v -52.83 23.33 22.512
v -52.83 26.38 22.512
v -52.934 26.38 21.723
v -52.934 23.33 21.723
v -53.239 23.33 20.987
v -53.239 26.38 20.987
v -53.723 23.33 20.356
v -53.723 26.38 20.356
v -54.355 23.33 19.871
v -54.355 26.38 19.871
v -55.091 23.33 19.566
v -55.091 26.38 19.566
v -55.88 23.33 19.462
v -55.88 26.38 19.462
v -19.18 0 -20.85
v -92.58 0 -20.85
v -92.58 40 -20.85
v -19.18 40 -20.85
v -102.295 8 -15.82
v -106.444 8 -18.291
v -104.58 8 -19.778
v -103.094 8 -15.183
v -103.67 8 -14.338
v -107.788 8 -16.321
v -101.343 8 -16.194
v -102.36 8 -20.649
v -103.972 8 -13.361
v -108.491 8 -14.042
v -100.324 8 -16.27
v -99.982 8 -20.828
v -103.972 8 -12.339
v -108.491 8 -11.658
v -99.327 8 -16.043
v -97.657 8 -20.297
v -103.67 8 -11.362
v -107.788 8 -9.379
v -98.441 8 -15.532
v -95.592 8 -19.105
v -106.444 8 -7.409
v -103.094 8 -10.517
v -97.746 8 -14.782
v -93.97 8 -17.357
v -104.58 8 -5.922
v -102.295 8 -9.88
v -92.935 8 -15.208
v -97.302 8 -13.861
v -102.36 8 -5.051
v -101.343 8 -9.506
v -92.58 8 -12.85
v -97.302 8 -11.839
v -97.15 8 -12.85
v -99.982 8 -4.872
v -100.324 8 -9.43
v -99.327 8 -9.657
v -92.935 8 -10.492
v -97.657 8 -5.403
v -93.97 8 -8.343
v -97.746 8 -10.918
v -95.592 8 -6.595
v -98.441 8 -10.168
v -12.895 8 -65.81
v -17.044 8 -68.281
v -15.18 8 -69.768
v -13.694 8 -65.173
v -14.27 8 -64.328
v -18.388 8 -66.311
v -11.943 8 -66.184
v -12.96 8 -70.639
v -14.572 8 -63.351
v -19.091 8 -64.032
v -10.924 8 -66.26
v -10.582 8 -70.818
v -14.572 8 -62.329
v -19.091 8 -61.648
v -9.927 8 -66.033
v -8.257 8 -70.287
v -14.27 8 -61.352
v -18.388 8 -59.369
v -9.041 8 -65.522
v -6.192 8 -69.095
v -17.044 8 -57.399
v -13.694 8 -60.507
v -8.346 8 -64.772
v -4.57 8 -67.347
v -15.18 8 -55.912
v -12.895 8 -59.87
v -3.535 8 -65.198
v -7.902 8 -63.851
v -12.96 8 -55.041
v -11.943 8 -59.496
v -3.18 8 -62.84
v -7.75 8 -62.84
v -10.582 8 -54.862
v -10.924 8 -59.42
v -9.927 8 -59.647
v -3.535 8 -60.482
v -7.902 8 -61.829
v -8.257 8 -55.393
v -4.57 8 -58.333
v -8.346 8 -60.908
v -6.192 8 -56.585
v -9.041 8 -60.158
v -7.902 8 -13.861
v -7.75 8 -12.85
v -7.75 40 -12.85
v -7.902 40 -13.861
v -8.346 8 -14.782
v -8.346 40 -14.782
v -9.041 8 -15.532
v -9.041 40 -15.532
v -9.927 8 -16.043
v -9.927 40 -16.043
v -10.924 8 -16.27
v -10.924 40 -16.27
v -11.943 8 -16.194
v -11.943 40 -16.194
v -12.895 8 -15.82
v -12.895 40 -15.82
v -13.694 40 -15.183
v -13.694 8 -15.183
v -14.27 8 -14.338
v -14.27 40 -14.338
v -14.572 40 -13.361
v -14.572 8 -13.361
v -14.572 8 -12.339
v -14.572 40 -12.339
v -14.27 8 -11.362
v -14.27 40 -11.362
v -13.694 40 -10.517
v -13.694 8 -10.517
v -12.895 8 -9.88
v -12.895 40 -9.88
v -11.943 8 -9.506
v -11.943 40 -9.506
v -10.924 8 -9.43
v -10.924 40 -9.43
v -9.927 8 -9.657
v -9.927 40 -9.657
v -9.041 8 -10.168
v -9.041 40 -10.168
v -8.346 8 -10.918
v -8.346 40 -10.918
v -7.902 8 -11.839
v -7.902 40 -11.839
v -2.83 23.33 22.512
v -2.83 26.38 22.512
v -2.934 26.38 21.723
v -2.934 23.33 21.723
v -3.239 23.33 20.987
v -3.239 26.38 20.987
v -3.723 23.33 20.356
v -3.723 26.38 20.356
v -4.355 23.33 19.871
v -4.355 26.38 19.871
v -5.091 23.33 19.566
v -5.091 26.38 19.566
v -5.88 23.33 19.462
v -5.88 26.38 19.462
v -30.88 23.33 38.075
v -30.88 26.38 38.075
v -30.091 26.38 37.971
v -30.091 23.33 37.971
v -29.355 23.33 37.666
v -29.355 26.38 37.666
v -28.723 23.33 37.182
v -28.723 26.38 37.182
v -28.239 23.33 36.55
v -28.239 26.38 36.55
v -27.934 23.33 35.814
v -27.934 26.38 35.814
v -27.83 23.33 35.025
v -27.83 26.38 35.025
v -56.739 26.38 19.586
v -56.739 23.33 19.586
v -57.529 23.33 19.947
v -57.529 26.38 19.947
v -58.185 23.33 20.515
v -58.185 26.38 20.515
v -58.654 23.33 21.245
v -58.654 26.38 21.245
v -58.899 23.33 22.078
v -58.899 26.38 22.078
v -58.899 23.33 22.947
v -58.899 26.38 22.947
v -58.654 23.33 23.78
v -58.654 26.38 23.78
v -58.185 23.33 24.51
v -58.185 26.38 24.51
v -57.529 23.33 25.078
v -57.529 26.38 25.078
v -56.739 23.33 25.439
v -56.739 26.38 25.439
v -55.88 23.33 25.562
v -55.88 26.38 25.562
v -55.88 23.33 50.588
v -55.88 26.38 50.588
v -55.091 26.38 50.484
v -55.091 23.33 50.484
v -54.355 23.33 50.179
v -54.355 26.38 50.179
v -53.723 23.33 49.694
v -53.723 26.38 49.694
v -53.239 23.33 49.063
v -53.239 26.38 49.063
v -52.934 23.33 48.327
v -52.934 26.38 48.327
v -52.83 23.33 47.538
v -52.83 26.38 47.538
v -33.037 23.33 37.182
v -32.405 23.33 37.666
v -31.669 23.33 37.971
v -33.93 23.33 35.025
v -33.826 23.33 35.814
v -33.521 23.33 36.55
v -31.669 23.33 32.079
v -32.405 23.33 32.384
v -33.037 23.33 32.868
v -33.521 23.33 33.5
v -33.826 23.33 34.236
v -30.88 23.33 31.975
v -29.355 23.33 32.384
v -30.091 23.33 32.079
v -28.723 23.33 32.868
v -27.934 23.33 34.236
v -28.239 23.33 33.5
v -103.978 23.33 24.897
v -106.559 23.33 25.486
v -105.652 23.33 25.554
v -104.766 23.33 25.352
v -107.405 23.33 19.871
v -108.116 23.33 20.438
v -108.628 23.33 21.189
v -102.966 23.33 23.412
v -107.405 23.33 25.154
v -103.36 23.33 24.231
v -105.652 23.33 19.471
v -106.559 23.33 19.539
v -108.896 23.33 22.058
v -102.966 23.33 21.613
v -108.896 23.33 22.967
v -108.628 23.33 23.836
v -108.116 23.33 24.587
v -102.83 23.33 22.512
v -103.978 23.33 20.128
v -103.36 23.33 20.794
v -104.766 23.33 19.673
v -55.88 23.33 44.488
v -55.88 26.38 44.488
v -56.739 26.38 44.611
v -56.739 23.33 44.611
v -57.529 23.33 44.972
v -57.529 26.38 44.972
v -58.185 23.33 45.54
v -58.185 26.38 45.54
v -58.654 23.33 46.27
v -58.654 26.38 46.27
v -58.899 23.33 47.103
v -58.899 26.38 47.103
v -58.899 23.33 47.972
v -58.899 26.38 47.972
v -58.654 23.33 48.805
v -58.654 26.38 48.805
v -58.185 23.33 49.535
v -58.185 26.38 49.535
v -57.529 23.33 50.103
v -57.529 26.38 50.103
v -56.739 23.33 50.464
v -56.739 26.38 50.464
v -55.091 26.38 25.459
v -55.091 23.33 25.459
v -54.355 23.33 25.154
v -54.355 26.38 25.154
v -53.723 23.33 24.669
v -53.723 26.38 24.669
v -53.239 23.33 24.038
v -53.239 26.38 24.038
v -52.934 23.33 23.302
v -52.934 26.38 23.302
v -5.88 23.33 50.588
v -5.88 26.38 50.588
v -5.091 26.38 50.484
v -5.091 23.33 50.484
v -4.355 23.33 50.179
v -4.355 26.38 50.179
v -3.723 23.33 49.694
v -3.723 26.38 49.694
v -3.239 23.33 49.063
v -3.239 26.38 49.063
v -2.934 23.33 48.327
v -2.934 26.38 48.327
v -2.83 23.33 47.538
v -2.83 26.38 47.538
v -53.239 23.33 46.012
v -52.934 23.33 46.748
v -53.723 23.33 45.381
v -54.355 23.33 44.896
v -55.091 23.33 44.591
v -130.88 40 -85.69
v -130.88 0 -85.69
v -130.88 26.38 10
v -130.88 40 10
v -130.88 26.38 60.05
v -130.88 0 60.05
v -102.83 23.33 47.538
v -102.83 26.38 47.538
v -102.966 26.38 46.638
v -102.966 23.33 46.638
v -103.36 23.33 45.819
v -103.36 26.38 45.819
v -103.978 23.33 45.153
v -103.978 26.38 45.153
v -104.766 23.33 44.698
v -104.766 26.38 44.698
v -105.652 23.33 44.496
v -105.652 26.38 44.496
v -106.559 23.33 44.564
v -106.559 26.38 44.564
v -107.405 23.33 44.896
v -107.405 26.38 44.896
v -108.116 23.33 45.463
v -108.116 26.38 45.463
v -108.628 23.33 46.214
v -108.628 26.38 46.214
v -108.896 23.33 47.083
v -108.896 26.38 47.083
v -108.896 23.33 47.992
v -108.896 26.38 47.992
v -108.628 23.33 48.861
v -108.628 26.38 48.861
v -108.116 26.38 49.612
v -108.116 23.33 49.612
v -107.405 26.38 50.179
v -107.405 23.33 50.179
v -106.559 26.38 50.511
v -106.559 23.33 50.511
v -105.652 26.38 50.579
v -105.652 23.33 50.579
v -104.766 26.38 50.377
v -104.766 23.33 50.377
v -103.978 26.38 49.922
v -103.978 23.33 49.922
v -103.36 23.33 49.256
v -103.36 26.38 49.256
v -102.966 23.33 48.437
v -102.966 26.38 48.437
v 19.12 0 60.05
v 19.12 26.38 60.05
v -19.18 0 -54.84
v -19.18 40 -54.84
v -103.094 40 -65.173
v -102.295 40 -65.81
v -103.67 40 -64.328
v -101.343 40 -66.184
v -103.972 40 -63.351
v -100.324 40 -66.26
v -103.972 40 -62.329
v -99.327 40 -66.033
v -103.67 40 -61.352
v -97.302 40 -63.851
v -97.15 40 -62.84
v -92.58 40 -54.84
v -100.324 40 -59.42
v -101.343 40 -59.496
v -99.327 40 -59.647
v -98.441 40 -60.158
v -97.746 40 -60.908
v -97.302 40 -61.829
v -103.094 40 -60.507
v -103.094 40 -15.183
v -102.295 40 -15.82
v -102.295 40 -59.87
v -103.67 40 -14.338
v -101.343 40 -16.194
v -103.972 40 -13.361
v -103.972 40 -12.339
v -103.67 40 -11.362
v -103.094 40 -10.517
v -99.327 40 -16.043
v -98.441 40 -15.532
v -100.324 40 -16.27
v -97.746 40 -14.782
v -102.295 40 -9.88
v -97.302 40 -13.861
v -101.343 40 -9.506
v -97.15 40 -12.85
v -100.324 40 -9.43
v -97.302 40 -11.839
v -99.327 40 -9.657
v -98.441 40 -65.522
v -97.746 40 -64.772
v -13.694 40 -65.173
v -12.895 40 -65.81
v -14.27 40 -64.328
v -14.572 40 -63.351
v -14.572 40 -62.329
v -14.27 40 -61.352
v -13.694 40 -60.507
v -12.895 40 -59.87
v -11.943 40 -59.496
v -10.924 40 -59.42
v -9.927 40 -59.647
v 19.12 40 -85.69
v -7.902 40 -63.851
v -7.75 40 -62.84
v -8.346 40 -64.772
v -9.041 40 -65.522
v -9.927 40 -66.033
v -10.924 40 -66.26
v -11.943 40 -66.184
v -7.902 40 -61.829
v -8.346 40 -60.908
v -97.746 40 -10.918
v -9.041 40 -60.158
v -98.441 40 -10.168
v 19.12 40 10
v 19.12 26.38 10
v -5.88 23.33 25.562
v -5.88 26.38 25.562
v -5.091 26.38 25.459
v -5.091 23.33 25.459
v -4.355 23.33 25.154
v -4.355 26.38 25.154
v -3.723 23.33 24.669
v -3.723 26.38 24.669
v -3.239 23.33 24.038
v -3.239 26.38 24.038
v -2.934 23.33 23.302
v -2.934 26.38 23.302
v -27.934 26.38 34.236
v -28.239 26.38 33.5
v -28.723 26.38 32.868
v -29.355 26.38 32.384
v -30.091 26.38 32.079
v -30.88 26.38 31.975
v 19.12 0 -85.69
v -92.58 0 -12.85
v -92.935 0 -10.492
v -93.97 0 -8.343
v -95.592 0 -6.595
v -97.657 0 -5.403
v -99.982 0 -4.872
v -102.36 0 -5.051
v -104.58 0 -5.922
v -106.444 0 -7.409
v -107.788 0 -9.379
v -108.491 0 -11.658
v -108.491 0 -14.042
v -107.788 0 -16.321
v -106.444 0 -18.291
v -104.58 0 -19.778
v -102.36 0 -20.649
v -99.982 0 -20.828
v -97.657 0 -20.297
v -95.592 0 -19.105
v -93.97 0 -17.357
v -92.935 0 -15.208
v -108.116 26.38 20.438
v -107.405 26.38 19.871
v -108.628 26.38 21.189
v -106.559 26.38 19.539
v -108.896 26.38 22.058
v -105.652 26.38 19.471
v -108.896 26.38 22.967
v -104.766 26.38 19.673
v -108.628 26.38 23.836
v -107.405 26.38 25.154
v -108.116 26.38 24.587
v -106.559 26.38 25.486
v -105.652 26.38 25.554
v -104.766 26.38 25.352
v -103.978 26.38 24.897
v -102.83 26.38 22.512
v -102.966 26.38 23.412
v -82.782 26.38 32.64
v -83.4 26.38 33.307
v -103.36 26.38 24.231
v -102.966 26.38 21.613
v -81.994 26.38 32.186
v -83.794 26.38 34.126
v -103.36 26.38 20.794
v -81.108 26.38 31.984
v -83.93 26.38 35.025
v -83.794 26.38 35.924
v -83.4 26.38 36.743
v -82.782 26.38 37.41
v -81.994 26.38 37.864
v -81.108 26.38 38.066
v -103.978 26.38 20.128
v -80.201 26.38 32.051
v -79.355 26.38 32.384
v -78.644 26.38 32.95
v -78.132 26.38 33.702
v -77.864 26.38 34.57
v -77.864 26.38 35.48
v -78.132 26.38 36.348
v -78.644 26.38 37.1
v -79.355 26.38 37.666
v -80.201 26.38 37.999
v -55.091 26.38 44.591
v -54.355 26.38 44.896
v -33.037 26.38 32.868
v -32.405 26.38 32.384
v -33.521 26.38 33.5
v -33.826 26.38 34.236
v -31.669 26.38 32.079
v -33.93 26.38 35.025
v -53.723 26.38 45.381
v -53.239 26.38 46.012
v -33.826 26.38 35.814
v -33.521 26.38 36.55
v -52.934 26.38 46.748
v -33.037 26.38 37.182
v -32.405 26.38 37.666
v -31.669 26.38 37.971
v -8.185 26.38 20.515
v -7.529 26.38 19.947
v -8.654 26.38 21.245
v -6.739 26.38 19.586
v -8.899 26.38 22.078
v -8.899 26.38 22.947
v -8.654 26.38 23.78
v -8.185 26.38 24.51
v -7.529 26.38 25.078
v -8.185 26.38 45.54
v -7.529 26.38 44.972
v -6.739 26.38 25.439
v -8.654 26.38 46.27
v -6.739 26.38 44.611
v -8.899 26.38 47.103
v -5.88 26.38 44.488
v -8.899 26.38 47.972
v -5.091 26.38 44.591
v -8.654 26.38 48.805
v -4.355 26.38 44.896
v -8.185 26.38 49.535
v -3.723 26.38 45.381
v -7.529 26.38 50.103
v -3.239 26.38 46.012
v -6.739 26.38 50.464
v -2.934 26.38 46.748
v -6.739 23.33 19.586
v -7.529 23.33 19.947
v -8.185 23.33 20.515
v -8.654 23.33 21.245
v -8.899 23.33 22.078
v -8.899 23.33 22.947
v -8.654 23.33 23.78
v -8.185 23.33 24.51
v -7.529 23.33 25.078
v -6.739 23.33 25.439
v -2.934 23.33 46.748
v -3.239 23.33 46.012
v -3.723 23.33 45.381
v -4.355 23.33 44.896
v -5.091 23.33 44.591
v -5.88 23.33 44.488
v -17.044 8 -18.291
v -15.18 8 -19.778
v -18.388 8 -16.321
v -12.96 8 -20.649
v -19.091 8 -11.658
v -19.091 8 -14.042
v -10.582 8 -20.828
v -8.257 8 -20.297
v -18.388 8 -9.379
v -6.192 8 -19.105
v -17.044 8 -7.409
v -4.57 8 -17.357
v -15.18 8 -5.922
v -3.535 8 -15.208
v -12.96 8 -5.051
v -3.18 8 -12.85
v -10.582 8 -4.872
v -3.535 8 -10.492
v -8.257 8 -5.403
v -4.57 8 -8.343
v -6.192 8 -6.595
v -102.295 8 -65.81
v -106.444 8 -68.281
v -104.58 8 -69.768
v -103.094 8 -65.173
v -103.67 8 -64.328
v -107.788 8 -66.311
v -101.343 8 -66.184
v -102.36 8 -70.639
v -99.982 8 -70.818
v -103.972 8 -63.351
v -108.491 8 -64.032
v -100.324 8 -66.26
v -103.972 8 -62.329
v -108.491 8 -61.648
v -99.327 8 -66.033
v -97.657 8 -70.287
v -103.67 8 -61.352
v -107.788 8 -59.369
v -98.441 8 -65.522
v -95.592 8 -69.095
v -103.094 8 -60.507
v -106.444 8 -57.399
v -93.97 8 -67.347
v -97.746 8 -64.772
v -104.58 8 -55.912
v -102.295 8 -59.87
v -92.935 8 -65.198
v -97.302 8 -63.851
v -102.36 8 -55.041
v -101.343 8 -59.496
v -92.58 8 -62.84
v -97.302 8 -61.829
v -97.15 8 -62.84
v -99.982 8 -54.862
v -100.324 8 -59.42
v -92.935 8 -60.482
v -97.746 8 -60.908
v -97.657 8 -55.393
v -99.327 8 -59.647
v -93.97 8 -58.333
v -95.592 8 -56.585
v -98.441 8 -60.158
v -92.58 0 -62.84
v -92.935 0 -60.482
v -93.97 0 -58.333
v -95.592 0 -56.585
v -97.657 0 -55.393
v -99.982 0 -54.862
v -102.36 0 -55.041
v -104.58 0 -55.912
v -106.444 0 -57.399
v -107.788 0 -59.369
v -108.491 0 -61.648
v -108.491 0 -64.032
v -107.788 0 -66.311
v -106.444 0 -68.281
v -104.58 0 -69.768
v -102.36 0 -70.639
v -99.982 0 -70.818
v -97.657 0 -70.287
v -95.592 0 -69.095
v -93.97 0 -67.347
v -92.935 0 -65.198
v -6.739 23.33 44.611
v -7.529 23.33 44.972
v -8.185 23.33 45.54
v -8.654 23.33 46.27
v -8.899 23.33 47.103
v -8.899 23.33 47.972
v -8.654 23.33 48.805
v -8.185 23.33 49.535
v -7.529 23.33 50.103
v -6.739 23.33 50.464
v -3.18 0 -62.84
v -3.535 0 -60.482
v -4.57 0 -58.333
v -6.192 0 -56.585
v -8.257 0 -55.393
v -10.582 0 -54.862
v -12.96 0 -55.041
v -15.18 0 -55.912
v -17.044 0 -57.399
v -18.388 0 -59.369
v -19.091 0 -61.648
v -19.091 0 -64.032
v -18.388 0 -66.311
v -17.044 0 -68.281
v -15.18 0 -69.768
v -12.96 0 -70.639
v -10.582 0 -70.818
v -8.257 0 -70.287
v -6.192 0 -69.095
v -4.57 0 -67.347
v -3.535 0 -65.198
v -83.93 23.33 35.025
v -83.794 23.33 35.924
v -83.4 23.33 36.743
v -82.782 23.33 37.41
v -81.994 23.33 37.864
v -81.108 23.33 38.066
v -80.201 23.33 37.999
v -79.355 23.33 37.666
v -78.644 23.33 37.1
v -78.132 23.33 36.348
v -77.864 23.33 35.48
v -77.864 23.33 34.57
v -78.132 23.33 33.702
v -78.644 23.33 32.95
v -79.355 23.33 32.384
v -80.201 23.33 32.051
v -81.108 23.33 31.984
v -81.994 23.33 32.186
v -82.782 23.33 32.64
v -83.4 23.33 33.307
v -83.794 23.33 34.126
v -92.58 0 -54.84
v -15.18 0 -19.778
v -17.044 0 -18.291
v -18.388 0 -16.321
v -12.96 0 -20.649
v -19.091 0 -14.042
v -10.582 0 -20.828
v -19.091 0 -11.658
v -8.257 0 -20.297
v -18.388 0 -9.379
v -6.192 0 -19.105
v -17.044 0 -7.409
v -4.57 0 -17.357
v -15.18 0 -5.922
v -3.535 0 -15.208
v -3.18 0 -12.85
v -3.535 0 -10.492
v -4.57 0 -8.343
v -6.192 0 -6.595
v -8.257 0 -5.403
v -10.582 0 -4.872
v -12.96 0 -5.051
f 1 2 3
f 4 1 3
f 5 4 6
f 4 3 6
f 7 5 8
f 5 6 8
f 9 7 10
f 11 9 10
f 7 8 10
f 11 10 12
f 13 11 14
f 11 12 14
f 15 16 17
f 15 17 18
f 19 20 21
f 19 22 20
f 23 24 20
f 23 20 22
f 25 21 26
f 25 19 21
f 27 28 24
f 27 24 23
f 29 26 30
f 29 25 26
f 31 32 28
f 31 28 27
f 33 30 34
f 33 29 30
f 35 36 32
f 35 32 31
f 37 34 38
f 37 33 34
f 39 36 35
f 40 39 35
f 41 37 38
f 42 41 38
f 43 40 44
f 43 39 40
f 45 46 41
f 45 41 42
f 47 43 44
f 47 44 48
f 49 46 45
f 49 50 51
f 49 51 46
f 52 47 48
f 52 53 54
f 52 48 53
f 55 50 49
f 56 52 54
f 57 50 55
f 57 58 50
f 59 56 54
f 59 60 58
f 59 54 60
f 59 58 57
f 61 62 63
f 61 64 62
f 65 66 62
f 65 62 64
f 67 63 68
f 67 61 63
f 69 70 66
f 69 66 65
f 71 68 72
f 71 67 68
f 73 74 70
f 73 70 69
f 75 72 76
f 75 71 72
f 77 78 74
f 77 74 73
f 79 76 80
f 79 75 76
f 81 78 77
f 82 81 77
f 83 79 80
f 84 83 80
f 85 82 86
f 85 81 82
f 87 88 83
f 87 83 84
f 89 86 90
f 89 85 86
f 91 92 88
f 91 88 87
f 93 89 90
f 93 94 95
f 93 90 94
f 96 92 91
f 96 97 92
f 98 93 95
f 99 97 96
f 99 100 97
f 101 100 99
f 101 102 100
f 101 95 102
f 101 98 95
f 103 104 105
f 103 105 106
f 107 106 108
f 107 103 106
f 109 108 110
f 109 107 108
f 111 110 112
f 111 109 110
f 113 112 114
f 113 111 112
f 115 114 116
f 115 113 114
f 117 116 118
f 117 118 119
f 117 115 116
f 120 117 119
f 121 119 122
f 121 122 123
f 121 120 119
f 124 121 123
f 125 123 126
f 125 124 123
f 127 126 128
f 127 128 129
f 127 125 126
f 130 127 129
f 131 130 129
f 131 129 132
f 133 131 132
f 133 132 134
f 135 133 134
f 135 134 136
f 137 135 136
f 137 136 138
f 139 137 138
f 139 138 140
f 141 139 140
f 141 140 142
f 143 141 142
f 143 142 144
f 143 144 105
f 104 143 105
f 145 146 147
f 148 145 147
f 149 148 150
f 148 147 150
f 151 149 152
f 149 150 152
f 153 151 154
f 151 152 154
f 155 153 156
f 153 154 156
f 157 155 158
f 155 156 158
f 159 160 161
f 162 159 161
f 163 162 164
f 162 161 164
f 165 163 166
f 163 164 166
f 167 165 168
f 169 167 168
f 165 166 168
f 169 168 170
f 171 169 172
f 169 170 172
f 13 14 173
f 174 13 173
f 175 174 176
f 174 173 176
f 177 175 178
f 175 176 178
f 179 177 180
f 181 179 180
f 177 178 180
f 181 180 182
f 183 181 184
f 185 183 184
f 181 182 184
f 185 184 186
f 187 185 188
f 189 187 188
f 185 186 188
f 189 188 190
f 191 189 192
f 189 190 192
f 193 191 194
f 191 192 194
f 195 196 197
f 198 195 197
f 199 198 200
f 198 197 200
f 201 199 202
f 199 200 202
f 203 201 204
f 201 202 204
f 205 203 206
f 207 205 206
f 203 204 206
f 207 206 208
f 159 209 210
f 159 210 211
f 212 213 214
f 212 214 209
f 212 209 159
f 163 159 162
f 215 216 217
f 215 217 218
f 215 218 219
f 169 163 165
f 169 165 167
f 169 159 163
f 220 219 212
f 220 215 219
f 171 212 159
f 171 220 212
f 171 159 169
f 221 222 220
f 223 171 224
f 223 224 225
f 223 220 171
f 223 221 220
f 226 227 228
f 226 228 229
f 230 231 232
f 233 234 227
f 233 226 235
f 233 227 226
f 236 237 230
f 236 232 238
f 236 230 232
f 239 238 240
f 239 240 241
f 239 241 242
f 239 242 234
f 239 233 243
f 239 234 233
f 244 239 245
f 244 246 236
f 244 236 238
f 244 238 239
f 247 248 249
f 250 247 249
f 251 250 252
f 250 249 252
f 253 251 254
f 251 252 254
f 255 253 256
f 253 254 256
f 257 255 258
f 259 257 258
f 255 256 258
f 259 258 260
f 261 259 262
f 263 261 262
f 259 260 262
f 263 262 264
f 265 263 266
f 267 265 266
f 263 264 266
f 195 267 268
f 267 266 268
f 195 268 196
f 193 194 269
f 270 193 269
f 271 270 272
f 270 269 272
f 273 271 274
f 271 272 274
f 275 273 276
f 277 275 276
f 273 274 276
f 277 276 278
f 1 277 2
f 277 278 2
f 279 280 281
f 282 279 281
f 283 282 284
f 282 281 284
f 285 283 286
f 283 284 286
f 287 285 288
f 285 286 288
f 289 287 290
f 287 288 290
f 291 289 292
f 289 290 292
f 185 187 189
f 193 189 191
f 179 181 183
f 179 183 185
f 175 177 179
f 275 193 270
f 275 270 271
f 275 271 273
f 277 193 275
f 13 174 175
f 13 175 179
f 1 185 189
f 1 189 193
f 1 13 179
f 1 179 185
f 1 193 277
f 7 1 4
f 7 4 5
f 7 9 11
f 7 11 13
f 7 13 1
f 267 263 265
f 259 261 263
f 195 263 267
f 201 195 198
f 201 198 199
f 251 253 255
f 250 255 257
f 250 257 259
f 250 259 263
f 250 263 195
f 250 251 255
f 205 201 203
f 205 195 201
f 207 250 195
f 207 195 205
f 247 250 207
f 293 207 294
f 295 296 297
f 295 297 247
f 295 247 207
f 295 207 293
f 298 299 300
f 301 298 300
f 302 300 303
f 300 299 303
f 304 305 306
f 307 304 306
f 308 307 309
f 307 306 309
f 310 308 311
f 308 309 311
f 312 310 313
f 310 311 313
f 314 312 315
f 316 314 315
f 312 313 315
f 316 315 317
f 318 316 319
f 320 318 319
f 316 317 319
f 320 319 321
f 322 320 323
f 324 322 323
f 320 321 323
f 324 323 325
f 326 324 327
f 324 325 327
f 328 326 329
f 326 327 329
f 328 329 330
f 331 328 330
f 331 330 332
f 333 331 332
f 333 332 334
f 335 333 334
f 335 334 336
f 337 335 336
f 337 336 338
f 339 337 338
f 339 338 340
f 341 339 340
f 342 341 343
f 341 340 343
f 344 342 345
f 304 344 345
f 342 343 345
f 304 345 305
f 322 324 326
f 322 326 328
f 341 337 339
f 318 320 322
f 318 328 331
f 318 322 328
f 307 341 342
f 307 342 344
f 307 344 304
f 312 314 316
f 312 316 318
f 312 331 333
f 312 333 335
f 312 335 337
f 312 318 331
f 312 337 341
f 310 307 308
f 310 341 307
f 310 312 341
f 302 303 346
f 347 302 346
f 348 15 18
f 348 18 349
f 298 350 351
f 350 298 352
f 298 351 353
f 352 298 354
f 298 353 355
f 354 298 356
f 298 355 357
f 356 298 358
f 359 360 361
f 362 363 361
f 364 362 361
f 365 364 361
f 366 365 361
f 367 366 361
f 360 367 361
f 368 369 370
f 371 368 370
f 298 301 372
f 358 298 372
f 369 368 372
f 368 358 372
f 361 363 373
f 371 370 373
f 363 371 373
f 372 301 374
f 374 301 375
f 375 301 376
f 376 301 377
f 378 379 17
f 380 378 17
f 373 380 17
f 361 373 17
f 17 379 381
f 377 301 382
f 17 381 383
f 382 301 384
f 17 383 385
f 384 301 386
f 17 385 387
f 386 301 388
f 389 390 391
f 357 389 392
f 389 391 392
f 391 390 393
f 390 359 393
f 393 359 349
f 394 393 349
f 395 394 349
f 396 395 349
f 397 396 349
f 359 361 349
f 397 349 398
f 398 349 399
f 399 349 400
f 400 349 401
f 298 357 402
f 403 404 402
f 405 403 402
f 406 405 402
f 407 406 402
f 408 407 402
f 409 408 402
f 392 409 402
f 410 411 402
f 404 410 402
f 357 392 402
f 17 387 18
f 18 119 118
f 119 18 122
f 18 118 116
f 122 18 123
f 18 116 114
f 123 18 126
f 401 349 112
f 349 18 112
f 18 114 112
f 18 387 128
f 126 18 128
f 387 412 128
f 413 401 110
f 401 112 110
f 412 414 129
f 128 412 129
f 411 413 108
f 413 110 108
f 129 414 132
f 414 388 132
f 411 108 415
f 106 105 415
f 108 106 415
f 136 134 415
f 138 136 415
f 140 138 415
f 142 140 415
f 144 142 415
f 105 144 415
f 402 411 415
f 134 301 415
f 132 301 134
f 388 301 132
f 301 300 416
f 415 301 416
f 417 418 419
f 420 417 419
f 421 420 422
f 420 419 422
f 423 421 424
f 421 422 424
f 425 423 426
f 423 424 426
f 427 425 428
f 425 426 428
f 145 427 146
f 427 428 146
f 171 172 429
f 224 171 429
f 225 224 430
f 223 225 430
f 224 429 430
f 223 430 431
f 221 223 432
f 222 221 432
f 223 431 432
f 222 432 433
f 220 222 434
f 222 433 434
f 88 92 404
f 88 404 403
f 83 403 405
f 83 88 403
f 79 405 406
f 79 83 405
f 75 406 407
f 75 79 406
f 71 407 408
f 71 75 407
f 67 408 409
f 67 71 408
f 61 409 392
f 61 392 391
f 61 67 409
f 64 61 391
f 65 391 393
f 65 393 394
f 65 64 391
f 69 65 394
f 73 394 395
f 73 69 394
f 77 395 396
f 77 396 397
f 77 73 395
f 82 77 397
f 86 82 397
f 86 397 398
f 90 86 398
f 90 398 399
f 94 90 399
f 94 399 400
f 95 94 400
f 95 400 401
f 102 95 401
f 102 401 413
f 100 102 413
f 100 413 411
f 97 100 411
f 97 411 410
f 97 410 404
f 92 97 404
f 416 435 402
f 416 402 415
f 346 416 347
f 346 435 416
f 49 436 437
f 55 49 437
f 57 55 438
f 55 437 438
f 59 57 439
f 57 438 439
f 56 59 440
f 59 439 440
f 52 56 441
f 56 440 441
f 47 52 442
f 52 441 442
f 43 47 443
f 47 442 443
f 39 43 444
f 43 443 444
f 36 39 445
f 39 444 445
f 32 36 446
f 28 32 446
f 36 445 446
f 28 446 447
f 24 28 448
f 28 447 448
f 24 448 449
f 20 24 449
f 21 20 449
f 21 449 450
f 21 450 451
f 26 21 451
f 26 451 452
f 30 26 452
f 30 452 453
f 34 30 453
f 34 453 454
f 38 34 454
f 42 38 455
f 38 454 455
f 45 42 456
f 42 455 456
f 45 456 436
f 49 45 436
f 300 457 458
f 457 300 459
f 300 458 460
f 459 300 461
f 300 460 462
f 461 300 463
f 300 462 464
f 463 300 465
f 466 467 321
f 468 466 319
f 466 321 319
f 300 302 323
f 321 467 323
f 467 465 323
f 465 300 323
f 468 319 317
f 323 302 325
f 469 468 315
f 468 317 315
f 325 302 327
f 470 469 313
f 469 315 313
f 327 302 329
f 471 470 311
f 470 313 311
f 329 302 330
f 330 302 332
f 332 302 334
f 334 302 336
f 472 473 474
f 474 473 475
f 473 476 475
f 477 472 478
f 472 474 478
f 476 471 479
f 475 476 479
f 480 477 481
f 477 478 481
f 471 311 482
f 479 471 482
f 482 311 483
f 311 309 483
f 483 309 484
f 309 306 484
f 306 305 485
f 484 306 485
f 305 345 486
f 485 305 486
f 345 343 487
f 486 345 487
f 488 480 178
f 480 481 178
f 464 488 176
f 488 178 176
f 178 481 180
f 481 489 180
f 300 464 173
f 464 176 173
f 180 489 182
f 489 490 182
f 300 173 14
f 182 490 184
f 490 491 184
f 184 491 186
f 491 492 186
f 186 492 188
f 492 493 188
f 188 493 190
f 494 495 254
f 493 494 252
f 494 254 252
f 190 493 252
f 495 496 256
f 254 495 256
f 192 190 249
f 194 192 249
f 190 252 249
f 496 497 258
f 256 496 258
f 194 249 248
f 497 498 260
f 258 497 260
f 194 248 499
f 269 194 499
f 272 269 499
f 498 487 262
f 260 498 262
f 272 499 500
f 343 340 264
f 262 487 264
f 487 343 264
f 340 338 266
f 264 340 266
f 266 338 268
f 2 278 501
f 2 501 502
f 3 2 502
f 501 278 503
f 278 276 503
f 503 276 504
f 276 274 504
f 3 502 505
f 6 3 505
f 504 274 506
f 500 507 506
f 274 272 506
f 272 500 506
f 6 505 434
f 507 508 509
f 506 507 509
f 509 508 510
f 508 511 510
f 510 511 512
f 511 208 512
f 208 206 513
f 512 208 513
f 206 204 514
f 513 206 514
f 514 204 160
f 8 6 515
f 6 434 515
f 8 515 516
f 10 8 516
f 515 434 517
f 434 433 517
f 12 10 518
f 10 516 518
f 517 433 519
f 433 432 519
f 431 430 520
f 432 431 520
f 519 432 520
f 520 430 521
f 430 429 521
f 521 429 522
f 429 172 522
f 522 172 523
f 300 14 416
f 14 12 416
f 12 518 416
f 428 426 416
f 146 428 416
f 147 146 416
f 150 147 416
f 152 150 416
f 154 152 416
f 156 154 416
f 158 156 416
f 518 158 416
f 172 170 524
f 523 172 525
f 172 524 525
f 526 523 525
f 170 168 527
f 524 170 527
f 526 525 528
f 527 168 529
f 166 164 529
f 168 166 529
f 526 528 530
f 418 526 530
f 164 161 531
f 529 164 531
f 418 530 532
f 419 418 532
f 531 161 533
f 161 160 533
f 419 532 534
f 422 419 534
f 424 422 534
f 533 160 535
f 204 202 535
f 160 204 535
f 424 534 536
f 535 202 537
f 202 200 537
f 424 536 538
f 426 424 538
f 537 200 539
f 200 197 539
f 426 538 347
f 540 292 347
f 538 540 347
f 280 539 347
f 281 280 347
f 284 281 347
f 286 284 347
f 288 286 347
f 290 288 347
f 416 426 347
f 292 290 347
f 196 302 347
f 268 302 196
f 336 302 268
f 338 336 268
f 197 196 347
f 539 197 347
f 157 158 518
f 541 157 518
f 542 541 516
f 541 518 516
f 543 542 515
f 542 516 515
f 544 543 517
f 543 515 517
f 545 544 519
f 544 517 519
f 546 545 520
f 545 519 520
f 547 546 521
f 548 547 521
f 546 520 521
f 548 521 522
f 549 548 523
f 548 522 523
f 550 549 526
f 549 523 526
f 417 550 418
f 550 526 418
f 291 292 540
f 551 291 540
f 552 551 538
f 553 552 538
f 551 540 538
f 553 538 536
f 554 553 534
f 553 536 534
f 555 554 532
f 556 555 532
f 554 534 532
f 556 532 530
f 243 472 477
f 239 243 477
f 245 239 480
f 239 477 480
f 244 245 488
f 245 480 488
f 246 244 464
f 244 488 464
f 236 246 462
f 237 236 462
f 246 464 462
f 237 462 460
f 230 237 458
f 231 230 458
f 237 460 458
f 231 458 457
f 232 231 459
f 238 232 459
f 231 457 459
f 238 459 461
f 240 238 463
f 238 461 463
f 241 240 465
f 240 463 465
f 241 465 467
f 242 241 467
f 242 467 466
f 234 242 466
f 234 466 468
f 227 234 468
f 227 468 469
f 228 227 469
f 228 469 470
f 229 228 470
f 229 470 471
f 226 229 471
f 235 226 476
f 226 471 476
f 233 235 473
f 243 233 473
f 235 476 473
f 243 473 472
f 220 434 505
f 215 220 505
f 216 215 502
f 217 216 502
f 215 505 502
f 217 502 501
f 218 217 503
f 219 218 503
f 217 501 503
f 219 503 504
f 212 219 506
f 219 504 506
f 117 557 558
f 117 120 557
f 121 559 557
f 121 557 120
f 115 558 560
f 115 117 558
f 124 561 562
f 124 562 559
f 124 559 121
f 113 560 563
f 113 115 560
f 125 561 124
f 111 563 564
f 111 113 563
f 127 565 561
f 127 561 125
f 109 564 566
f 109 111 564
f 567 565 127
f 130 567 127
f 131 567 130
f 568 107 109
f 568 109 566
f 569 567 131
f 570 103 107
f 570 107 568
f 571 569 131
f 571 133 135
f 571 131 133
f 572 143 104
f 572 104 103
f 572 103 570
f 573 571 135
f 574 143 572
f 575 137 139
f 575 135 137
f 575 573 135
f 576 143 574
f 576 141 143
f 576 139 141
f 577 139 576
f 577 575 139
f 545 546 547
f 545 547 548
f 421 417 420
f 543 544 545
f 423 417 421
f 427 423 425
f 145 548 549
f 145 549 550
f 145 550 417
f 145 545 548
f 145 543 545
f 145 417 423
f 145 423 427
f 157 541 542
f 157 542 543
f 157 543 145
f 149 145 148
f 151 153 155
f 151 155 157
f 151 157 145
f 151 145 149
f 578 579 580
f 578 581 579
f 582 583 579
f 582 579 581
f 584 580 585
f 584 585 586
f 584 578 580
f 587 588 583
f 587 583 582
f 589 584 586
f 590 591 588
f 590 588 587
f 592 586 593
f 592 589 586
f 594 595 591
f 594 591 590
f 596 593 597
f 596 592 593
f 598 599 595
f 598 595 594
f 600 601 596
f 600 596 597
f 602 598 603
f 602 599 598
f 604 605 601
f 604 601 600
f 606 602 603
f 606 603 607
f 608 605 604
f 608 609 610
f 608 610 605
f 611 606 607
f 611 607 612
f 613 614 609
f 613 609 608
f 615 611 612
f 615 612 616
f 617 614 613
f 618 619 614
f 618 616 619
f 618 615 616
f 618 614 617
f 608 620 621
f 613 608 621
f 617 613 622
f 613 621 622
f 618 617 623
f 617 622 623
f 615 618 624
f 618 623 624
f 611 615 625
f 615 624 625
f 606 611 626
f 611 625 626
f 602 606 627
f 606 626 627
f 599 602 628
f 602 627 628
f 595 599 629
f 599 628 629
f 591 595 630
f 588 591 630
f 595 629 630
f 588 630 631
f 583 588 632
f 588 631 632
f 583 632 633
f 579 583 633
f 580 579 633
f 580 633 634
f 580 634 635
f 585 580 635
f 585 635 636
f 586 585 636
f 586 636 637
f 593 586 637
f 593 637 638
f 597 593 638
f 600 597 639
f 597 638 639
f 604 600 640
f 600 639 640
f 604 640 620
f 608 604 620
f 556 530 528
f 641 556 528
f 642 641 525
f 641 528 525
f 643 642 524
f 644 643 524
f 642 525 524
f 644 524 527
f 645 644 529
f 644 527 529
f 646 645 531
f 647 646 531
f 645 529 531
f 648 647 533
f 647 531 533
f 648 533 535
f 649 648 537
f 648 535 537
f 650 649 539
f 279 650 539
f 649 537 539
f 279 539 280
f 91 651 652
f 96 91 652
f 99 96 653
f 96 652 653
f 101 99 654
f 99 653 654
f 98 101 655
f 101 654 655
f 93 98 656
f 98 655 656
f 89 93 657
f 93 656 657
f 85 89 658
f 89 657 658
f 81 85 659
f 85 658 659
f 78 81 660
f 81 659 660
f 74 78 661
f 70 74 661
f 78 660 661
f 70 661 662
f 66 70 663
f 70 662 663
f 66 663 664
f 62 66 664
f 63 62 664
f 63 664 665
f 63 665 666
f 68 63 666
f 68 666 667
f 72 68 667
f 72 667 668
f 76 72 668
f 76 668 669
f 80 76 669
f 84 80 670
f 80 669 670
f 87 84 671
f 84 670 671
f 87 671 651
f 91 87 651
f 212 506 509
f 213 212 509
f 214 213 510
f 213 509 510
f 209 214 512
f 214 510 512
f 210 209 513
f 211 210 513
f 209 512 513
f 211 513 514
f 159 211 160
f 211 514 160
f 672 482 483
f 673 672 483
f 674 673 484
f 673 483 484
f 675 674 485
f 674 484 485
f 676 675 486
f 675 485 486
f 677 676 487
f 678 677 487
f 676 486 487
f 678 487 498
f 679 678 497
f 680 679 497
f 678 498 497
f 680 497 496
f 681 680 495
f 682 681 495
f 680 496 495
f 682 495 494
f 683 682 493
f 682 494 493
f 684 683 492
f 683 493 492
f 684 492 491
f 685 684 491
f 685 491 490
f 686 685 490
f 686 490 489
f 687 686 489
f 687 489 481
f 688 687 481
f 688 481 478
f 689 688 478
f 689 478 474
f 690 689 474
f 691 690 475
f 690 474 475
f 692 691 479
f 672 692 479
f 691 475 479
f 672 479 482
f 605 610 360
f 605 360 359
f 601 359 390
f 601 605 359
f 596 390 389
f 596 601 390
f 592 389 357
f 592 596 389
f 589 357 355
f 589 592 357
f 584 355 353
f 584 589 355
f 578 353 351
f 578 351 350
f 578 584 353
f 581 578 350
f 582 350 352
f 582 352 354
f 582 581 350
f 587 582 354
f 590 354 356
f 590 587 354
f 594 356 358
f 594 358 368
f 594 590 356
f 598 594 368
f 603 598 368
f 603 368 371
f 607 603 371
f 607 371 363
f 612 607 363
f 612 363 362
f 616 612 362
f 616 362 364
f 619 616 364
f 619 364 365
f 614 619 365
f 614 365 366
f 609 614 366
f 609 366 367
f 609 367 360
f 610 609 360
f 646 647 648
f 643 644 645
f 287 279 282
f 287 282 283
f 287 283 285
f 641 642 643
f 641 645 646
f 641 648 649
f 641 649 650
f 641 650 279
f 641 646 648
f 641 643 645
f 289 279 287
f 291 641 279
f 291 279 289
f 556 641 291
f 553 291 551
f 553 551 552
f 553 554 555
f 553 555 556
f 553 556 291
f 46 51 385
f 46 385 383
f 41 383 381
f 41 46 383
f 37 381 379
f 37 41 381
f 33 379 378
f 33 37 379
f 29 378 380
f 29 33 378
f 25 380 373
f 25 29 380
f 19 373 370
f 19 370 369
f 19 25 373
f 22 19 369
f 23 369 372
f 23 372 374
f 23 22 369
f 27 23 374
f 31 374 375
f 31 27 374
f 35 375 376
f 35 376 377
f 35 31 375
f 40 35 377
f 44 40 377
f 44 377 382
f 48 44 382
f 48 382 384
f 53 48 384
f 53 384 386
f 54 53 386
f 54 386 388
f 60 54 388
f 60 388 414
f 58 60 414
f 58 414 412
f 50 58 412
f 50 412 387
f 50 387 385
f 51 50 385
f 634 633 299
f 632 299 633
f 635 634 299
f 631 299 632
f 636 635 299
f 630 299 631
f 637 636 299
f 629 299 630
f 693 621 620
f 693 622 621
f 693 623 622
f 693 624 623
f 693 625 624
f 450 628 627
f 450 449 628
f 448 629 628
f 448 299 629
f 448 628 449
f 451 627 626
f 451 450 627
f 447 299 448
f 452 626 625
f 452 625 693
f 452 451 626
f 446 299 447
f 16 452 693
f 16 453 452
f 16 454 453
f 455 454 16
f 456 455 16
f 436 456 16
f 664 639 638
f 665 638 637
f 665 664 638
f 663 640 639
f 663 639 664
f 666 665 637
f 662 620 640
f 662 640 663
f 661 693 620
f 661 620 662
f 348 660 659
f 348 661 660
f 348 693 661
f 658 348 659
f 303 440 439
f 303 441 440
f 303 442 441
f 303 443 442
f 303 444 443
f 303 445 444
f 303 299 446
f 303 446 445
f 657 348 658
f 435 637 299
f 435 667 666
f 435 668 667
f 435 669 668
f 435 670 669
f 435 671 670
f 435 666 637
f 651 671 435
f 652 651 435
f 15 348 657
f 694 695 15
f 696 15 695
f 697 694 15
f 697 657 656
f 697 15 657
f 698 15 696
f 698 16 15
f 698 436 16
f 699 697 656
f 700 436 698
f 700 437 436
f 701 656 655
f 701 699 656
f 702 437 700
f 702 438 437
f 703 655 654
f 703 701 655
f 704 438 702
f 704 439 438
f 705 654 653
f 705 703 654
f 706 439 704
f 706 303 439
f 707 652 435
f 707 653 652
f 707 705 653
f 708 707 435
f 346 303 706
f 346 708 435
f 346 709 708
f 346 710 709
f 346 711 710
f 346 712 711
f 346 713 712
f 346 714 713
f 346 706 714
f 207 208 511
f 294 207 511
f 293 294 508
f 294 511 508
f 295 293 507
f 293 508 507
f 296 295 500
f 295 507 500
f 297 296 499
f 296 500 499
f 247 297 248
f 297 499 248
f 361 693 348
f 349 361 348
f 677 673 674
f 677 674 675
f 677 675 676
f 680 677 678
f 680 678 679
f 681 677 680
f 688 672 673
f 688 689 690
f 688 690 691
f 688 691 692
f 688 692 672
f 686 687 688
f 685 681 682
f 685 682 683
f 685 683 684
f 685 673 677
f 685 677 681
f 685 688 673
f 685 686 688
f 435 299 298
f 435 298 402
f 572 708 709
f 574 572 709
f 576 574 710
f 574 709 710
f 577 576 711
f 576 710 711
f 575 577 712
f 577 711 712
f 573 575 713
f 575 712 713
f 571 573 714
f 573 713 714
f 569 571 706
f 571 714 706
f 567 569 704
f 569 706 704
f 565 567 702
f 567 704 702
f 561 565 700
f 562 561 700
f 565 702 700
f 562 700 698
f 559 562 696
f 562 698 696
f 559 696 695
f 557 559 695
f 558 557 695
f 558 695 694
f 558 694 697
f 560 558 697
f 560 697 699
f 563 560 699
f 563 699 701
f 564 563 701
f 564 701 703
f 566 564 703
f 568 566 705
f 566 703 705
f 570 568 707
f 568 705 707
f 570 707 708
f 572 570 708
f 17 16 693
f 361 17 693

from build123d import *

# Parameters (mm, degrees)
SKETCH8_W           = 131.76
SKETCH8_H           = 95.69
SKETCH8_R           = 3.43
SKETCH8_W_2         = 73.4
SKETCH8_H_2         = 33.99
BOSS_EXTRUDE4_DEPTH = 40
SKETCH9_R           = 8
CUT_EXTRUDE2_DEPTH  = 8
SKETCH12_W          = 9.12
SKETCH12_H          = 95.69
BOSS_EXTRUDE5_DEPTH = 40
SKETCH13_W          = 150
SKETCH13_H          = 50.05
BOSS_EXTRUDE6_DEPTH = 26.38
SKETCH14_R          = 3.05
CUT_EXTRUDE3_DEPTH  = 3.05


with BuildPart() as part:
    # Sketch8 → Boss-Extrude4 (new body)
    with BuildSketch(Plane(origin=(0, 0, 0), x_dir=(1, 0, 0), z_dir=(0, 1, 0))):
        with Locations((-55.88, 37.845)):
            Rectangle(SKETCH8_W, SKETCH8_H)
        with Locations((-100.58, 12.85)):
            Circle(SKETCH8_R, mode=Mode.SUBTRACT)
        with Locations((-100.58, 62.84)):
            Circle(SKETCH8_R, mode=Mode.SUBTRACT)
        with Locations((-11.18, 62.84)):
            Circle(SKETCH8_R, mode=Mode.SUBTRACT)
        with Locations((-11.18, 12.85)):
            Circle(SKETCH8_R, mode=Mode.SUBTRACT)
        with Locations((-55.88, 37.845)):
            Rectangle(SKETCH8_W_2, SKETCH8_H_2, mode=Mode.SUBTRACT)
    extrude(amount=BOSS_EXTRUDE4_DEPTH)

    # Sketch9 → Cut-Extrude2 (cut)
    with BuildSketch(Plane.XZ):
        with Locations((-100.58, -12.85)):
            Circle(SKETCH9_R)
        with Locations((-11.18, -12.85)):
            Circle(SKETCH9_R)
        with Locations((-11.18, -62.84)):
            Circle(SKETCH9_R)
        with Locations((-100.58, -62.84)):
            Circle(SKETCH9_R)
    extrude(amount=-CUT_EXTRUDE2_DEPTH, mode=Mode.SUBTRACT)

    # Sketch12 → Boss-Extrude5 (add)
    with BuildSketch(Plane.XZ):
        with Locations((-126.32, -37.845)):
            Rectangle(SKETCH12_W, SKETCH12_H)
        with Locations((14.56, -37.845)):
            Rectangle(SKETCH12_W, SKETCH12_H)
    extrude(amount=-BOSS_EXTRUDE5_DEPTH)

    # Sketch13 → Boss-Extrude6 (add)
    with BuildSketch(Plane.XZ):
        with Locations((-55.88, 35.025)):
            Rectangle(SKETCH13_W, SKETCH13_H)
    extrude(amount=-BOSS_EXTRUDE6_DEPTH)

    # Sketch14 → Cut-Extrude3 (cut)
    with BuildSketch(Plane(origin=(0, 26.38, 0), x_dir=(1, 0, 0), z_dir=(0, 1, 0))):
        with Locations((-105.88, -22.5125)):
            Circle(SKETCH14_R)
        with Locations((-105.88, -47.5375)):
            Circle(SKETCH14_R)
        with BuildLine():
            ThreePointArc((-77.83, -35.025), (-80.88, -31.975), (-83.93, -35.025))
            Line((-83.93, -35.025), (-77.83, -35.025))
        make_face()
        with BuildLine():
            Line((-77.83, -35.025), (-83.93, -35.025))
            ThreePointArc((-83.93, -35.025), (-80.88, -38.075), (-77.83, -35.025))
        make_face()
        with BuildLine():
            ThreePointArc((-52.83, -22.5125), (-53.723324317, -20.355824317), (-55.88, -19.4625))
            Line((-55.88, -19.4625), (-55.88, -25.5625))
            ThreePointArc((-55.88, -25.5625), (-53.723324317, -24.669175683), (-52.83, -22.5125))
        make_face()
        with BuildLine():
            Line((-55.88, -25.5625), (-55.88, -19.4625))
            ThreePointArc((-55.88, -19.4625), (-58.93, -22.5125), (-55.88, -25.5625))
        make_face()
        with BuildLine():
            ThreePointArc((-55.88, -44.4875), (-58.93, -47.5375), (-55.88, -50.5875))
            Line((-55.88, -50.5875), (-55.88, -44.4875))
        make_face()
        with BuildLine():
            Line((-55.88, -44.4875), (-55.88, -50.5875))
            ThreePointArc((-55.88, -50.5875), (-53.723324317, -49.694175683), (-52.83, -47.5375))
            ThreePointArc((-52.83, -47.5375), (-53.723324317, -45.380824317), (-55.88, -44.4875))
        make_face()
        with BuildLine():
            ThreePointArc((-33.93, -35.025), (-33.036675683, -37.181675683), (-30.88, -38.075))
            Line((-30.88, -38.075), (-30.88, -35.025))
            Line((-30.88, -35.025), (-33.93, -35.025))
        make_face()
        with BuildLine():
            Line((-30.88, -35.025), (-30.88, -38.075))
            ThreePointArc((-30.88, -38.075), (-28.723324317, -37.181675683), (-27.83, -35.025))
            Line((-27.83, -35.025), (-30.88, -35.025))
        make_face()
        with BuildLine():
            ThreePointArc((-27.83, -35.025), (-28.723324317, -32.868324317), (-30.88, -31.975))
            Line((-30.88, -31.975), (-30.88, -35.025))
            Line((-30.88, -35.025), (-27.83, -35.025))
        make_face()
        with BuildLine():
            Line((-30.88, -35.025), (-30.88, -31.975))
            ThreePointArc((-30.88, -31.975), (-33.036675683, -32.868324317), (-33.93, -35.025))
            Line((-33.93, -35.025), (-30.88, -35.025))
        make_face()
        with BuildLine():
            ThreePointArc((-2.83, -22.5125), (-3.723324317, -20.355824317), (-5.88, -19.4625))
            Line((-5.88, -19.4625), (-5.88, -25.5625))
            ThreePointArc((-5.88, -25.5625), (-3.723324317, -24.669175683), (-2.83, -22.5125))
        make_face()
        with BuildLine():
            Line((-5.88, -25.5625), (-5.88, -19.4625))
            ThreePointArc((-5.88, -19.4625), (-8.93, -22.5125), (-5.88, -25.5625))
        make_face()
        with BuildLine():
            ThreePointArc((-5.88, -44.4875), (-8.93, -47.5375), (-5.88, -50.5875))
            Line((-5.88, -50.5875), (-5.88, -44.4875))
        make_face()
        with BuildLine():
            Line((-5.88, -44.4875), (-5.88, -50.5875))
            ThreePointArc((-5.88, -50.5875), (-3.723324317, -49.694175683), (-2.83, -47.5375))
            ThreePointArc((-2.83, -47.5375), (-3.723324317, -45.380824317), (-5.88, -44.4875))
        make_face()
    extrude(amount=-CUT_EXTRUDE3_DEPTH, mode=Mode.SUBTRACT)


solid = part.part
